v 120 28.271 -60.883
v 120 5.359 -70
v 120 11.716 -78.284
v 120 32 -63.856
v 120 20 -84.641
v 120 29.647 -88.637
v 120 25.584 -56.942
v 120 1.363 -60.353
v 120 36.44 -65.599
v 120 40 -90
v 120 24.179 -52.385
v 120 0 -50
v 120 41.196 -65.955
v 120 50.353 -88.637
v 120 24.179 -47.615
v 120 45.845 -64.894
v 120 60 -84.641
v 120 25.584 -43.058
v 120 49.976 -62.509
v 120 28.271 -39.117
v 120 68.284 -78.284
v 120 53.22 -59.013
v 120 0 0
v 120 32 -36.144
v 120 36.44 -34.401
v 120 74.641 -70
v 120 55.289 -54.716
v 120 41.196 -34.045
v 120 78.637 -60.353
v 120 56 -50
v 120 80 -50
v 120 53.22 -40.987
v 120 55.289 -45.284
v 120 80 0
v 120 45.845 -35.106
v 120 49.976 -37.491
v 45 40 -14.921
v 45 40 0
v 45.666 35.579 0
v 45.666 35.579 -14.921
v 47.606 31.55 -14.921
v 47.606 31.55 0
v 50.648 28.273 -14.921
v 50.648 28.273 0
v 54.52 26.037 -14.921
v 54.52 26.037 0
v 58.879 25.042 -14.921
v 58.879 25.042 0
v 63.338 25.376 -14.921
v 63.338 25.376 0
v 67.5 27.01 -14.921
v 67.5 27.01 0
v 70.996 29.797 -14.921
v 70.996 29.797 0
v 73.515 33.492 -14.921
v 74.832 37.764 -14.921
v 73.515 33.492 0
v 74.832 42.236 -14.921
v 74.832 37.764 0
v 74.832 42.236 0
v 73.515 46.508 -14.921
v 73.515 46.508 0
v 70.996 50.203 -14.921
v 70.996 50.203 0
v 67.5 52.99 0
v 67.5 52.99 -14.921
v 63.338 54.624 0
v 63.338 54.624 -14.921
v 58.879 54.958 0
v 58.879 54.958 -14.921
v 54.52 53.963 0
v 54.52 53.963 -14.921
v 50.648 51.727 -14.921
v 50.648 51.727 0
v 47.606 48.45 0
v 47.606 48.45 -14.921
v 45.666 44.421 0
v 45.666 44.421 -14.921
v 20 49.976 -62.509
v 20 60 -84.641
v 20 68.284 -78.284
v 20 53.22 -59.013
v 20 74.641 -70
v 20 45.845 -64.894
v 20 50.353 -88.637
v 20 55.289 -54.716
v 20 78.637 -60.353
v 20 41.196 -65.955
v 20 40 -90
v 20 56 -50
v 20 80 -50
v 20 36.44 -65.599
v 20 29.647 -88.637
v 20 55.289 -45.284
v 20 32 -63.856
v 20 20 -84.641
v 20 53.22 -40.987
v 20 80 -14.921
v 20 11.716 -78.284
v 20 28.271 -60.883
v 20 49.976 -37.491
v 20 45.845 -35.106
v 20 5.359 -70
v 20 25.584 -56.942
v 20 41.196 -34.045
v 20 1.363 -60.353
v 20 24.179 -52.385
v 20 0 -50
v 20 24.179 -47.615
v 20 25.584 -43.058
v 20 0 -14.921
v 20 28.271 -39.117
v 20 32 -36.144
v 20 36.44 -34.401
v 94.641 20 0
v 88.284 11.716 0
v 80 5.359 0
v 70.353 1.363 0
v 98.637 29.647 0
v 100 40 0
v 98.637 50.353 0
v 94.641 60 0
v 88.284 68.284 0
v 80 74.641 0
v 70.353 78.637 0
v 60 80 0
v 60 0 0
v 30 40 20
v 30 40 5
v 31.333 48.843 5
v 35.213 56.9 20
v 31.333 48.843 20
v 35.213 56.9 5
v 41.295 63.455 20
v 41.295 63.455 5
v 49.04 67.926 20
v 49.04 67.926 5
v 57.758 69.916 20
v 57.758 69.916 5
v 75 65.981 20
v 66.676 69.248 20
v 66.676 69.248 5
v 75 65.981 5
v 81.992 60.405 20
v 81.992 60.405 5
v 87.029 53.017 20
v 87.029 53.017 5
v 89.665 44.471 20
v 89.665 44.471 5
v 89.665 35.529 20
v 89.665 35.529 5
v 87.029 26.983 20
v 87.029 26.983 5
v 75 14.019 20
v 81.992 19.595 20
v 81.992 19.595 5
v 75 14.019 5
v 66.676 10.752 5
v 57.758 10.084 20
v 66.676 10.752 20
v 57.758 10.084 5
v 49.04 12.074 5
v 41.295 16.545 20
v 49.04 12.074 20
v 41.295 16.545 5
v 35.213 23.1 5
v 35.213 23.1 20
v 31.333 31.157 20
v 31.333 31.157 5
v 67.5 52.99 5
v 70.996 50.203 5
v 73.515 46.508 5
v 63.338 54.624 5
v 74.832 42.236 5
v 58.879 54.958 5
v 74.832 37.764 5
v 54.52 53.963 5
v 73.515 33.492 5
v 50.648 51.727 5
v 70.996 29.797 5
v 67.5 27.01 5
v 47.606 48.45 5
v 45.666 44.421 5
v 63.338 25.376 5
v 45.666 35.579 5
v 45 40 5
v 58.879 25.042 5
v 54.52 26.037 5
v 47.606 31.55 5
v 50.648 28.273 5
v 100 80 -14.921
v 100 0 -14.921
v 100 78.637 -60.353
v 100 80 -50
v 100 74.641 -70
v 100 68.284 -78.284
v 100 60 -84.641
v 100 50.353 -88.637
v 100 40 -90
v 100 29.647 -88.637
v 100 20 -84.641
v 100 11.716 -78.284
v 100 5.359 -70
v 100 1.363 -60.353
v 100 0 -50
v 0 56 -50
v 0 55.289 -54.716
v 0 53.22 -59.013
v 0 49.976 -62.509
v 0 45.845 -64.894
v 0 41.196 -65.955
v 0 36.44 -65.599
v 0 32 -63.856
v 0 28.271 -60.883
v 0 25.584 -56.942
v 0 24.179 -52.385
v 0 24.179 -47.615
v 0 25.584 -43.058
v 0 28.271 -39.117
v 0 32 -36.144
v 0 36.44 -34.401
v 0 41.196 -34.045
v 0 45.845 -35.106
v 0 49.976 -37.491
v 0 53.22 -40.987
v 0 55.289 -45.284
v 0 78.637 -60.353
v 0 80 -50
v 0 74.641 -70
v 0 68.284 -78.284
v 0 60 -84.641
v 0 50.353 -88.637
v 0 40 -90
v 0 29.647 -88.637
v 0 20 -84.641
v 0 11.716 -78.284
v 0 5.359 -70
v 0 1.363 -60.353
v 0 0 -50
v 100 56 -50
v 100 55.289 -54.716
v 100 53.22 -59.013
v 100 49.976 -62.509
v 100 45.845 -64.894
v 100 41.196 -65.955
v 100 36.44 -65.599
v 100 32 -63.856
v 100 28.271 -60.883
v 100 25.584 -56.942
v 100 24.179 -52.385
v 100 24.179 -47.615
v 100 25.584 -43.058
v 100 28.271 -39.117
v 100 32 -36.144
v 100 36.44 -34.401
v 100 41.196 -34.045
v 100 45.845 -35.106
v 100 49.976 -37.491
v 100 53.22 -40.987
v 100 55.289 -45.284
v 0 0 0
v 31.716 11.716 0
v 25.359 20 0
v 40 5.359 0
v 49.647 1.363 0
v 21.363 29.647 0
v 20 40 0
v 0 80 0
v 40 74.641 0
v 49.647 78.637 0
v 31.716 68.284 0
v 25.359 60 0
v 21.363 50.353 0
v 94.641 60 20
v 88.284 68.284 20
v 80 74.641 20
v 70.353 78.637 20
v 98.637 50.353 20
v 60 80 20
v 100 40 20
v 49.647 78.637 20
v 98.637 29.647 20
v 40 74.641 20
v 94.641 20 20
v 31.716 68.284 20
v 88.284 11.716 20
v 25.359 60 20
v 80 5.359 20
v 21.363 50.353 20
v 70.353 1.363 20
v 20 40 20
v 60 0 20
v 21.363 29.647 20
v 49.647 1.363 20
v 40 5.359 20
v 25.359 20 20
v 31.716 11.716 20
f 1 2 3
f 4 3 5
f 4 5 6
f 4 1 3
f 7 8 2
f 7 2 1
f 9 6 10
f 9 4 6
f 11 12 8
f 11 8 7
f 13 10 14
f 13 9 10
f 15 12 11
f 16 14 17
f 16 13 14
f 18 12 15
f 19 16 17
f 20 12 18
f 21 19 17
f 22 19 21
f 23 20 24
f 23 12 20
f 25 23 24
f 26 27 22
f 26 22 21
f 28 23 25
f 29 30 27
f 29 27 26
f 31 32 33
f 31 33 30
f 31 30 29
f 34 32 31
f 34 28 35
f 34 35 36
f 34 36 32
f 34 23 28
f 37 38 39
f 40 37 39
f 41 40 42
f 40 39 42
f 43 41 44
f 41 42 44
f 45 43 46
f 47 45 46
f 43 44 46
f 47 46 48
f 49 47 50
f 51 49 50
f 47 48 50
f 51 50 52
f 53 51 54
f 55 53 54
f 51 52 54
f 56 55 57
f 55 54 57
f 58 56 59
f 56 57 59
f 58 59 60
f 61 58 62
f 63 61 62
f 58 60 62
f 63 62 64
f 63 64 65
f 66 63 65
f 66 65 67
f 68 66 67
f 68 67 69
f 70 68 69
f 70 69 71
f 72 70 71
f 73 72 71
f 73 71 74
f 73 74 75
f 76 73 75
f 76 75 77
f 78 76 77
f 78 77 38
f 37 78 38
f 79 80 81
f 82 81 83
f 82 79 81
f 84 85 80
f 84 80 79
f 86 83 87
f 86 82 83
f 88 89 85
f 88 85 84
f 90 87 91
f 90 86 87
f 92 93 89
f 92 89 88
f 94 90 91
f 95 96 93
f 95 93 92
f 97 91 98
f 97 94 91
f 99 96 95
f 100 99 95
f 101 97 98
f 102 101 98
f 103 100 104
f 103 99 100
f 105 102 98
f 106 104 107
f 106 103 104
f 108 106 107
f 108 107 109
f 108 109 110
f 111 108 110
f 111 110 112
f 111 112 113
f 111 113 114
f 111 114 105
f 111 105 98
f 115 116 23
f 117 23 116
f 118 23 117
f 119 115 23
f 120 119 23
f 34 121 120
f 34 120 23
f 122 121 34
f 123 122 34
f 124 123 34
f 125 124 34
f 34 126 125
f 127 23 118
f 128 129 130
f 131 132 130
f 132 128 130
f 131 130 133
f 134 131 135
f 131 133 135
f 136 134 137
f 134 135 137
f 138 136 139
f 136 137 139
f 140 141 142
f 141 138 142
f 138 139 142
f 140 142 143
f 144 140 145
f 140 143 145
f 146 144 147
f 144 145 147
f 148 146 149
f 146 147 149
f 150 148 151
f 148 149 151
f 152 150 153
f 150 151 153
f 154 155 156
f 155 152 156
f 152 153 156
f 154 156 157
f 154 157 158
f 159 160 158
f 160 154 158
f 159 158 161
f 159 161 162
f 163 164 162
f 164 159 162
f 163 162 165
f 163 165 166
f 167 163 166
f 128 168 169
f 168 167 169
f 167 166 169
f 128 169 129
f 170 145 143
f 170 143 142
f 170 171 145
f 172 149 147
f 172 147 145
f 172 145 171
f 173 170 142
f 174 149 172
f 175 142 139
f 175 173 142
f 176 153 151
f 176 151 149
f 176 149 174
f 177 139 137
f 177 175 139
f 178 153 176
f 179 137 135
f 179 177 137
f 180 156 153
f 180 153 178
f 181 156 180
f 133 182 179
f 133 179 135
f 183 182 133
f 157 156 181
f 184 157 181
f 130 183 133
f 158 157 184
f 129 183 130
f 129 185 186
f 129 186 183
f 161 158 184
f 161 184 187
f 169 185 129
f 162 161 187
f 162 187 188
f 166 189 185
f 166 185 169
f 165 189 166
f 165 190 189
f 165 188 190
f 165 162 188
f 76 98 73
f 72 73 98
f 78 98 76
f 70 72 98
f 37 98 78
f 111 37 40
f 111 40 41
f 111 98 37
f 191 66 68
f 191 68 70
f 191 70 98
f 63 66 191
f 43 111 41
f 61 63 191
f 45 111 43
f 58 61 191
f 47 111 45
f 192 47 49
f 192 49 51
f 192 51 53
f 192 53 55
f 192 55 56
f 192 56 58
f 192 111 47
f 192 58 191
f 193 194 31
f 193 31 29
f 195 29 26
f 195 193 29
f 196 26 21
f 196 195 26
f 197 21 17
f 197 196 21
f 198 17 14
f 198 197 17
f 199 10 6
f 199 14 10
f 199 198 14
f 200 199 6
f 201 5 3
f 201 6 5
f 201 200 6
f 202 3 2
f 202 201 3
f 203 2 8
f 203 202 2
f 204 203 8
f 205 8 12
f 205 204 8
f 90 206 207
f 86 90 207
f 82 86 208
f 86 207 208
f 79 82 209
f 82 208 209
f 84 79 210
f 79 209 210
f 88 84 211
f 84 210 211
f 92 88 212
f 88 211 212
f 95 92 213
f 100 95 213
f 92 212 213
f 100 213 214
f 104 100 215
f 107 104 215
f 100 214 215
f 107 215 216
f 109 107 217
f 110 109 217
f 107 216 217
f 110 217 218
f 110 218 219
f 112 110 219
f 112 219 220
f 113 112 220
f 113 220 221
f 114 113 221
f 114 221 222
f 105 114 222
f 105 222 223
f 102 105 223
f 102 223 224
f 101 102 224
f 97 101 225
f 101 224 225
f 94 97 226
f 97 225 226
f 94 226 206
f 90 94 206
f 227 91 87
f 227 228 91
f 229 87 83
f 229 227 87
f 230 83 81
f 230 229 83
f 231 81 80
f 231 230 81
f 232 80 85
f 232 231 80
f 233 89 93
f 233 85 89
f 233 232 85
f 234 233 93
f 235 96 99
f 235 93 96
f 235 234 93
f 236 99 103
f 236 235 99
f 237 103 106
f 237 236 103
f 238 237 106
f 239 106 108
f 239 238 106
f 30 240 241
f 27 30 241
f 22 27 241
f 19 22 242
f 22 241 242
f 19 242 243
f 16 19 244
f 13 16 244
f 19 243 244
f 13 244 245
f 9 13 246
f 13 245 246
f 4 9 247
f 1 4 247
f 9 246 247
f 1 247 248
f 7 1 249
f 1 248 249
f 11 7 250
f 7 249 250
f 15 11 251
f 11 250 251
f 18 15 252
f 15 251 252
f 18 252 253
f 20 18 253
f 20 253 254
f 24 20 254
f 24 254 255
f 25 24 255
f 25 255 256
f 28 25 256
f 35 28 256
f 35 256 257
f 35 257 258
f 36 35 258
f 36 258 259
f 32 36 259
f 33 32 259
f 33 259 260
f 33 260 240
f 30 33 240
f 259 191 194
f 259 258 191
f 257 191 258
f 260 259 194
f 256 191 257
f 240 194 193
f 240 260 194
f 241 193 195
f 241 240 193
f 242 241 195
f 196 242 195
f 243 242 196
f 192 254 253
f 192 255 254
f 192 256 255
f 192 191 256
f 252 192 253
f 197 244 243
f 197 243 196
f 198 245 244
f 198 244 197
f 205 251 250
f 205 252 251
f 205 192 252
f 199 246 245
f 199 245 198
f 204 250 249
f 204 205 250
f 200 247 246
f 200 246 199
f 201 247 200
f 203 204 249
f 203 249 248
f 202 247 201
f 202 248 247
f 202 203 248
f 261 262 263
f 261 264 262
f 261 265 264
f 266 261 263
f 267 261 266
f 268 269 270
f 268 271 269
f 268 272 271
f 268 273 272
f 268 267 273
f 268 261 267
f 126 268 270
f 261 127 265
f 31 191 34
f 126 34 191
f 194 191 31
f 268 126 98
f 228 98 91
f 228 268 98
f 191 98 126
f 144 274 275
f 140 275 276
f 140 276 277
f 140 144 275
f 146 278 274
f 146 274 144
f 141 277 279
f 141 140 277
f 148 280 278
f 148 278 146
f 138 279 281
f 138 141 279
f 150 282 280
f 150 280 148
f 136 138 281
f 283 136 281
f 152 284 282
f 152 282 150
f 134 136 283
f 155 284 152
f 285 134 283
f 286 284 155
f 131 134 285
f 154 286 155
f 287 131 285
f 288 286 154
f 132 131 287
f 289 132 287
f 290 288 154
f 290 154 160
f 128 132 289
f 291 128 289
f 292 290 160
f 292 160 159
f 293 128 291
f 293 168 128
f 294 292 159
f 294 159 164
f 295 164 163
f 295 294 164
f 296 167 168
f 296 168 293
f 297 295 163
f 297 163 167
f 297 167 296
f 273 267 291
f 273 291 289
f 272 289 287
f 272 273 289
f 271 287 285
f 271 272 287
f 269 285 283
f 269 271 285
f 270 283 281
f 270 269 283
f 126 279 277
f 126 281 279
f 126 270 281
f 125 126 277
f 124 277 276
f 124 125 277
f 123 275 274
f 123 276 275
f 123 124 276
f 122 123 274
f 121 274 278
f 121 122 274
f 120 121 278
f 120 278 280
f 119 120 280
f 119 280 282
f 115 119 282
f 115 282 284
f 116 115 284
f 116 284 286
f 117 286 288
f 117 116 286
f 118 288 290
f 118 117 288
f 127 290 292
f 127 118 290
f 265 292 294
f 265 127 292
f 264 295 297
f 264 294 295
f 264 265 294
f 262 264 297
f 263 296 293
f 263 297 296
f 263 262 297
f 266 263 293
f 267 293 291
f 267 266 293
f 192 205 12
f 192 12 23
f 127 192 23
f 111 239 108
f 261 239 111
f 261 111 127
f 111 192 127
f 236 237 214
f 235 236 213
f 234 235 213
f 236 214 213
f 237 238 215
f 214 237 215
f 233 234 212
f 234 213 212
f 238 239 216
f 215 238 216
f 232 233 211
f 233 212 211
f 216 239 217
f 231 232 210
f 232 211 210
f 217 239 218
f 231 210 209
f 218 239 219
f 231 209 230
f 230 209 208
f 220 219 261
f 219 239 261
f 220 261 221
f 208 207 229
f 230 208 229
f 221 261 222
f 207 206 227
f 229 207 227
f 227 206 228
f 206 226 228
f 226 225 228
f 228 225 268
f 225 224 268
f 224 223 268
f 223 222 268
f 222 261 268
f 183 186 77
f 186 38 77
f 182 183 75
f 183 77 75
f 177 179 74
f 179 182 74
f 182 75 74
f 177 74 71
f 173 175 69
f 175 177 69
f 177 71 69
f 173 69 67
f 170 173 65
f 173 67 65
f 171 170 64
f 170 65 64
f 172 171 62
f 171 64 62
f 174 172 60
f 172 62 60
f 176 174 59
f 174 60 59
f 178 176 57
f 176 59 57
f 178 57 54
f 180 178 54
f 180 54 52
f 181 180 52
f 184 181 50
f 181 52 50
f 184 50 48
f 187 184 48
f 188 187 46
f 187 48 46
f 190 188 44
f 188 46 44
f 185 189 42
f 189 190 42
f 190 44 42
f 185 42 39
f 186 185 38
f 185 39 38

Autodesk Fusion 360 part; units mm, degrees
sketch "Sketch1" plane through (0, 0, 0) normal (1, 0, 0) x (0, 1, 0)
  line L0 (0, 0) -> (80, 0)
  line L1 (80, 0) -> (80, -50)
  line L2 (80, -50) -> (0, -50)
  line L3 (0, -50) -> (0, 0)
  arc A0 (0, -50) -> (80, -50) centre (40, -50) ccw
  circle A1 centre (40, -50) radius 16
sketch "Sketch2" plane through (0, 0, 0) normal (1, 0, 0) x (0, 1, 0)
extrude "Extrude1" add sketch "Sketch1" along normal blind 120 contours L0 L1 L2 L3 A1 | L2 A0 A1
sketch "Sketch3" plane through (0, 0, 0) normal (1, 0, 0) x (0, 1, 0)
sketch "Sketch4" plane through (0, 0, 0) normal (0, -1, 0) x (1, 0, 0)
  line L0 (0, 0) -> (0, -50)
  line L1 (0, -50) -> (120, -50)
  line L2 (120, -50) -> (120, 0)
  line L3 (120, 0) -> (0, 0)
  line L4 (0, 0) -> (20, 0)
  line L5 (0, 0) -> (0, -15)
  line L6 (20, -14.9206) -> (100, -14.9206)
  line L7 (100, -14.9206) -> (100, -90)
  line L8 (100, -90) -> (20, -90)
  line L9 (20, -90) -> (20, -14.9206)
  dimension "d3" = 20
  dimension "d4" = 15
extrude "Extrude2" cut sketch "Sketch4" against normal blind 90 contours L1 L6 L7 L9 | L1 L7 L8 L9
sketch "Sketch5" plane through (0, 0, 0) normal (0, 0, 1) x (-1, 0, 0)
  line L0 (0, -80) -> (0, 0)
  line L1 (0, 0) -> (-120, 0)
  line L2 (-120, 0) -> (-120, -80)
  line L3 (-120, -80) -> (0, -80)
sketch "Sketch6" plane through (0, 0, 0) normal (0, 0, 1) x (-1, 0, 0)
  circle A0 centre (-60, -40) radius 40
  circle A1 centre (-60, -40) radius 30
  circle A2 centre (-60, -40) radius 15
  dimension "d7" = 60
  dimension "d8" = 30
extrude "Extrude4" cut sketch "Sketch6" against normal blind 25 contours A2
extrude "Extrude5" add sketch "Sketch6" along normal blind 5 contours A1
extrude "Extrude6" add sketch "Sketch6" along normal blind 20 contours A0
extrude "Extrude3" [suppressed]
sketch "Sketch7" plane through (0, 0, 0) normal (0, 0, 1) x (-1, 0, 0)
